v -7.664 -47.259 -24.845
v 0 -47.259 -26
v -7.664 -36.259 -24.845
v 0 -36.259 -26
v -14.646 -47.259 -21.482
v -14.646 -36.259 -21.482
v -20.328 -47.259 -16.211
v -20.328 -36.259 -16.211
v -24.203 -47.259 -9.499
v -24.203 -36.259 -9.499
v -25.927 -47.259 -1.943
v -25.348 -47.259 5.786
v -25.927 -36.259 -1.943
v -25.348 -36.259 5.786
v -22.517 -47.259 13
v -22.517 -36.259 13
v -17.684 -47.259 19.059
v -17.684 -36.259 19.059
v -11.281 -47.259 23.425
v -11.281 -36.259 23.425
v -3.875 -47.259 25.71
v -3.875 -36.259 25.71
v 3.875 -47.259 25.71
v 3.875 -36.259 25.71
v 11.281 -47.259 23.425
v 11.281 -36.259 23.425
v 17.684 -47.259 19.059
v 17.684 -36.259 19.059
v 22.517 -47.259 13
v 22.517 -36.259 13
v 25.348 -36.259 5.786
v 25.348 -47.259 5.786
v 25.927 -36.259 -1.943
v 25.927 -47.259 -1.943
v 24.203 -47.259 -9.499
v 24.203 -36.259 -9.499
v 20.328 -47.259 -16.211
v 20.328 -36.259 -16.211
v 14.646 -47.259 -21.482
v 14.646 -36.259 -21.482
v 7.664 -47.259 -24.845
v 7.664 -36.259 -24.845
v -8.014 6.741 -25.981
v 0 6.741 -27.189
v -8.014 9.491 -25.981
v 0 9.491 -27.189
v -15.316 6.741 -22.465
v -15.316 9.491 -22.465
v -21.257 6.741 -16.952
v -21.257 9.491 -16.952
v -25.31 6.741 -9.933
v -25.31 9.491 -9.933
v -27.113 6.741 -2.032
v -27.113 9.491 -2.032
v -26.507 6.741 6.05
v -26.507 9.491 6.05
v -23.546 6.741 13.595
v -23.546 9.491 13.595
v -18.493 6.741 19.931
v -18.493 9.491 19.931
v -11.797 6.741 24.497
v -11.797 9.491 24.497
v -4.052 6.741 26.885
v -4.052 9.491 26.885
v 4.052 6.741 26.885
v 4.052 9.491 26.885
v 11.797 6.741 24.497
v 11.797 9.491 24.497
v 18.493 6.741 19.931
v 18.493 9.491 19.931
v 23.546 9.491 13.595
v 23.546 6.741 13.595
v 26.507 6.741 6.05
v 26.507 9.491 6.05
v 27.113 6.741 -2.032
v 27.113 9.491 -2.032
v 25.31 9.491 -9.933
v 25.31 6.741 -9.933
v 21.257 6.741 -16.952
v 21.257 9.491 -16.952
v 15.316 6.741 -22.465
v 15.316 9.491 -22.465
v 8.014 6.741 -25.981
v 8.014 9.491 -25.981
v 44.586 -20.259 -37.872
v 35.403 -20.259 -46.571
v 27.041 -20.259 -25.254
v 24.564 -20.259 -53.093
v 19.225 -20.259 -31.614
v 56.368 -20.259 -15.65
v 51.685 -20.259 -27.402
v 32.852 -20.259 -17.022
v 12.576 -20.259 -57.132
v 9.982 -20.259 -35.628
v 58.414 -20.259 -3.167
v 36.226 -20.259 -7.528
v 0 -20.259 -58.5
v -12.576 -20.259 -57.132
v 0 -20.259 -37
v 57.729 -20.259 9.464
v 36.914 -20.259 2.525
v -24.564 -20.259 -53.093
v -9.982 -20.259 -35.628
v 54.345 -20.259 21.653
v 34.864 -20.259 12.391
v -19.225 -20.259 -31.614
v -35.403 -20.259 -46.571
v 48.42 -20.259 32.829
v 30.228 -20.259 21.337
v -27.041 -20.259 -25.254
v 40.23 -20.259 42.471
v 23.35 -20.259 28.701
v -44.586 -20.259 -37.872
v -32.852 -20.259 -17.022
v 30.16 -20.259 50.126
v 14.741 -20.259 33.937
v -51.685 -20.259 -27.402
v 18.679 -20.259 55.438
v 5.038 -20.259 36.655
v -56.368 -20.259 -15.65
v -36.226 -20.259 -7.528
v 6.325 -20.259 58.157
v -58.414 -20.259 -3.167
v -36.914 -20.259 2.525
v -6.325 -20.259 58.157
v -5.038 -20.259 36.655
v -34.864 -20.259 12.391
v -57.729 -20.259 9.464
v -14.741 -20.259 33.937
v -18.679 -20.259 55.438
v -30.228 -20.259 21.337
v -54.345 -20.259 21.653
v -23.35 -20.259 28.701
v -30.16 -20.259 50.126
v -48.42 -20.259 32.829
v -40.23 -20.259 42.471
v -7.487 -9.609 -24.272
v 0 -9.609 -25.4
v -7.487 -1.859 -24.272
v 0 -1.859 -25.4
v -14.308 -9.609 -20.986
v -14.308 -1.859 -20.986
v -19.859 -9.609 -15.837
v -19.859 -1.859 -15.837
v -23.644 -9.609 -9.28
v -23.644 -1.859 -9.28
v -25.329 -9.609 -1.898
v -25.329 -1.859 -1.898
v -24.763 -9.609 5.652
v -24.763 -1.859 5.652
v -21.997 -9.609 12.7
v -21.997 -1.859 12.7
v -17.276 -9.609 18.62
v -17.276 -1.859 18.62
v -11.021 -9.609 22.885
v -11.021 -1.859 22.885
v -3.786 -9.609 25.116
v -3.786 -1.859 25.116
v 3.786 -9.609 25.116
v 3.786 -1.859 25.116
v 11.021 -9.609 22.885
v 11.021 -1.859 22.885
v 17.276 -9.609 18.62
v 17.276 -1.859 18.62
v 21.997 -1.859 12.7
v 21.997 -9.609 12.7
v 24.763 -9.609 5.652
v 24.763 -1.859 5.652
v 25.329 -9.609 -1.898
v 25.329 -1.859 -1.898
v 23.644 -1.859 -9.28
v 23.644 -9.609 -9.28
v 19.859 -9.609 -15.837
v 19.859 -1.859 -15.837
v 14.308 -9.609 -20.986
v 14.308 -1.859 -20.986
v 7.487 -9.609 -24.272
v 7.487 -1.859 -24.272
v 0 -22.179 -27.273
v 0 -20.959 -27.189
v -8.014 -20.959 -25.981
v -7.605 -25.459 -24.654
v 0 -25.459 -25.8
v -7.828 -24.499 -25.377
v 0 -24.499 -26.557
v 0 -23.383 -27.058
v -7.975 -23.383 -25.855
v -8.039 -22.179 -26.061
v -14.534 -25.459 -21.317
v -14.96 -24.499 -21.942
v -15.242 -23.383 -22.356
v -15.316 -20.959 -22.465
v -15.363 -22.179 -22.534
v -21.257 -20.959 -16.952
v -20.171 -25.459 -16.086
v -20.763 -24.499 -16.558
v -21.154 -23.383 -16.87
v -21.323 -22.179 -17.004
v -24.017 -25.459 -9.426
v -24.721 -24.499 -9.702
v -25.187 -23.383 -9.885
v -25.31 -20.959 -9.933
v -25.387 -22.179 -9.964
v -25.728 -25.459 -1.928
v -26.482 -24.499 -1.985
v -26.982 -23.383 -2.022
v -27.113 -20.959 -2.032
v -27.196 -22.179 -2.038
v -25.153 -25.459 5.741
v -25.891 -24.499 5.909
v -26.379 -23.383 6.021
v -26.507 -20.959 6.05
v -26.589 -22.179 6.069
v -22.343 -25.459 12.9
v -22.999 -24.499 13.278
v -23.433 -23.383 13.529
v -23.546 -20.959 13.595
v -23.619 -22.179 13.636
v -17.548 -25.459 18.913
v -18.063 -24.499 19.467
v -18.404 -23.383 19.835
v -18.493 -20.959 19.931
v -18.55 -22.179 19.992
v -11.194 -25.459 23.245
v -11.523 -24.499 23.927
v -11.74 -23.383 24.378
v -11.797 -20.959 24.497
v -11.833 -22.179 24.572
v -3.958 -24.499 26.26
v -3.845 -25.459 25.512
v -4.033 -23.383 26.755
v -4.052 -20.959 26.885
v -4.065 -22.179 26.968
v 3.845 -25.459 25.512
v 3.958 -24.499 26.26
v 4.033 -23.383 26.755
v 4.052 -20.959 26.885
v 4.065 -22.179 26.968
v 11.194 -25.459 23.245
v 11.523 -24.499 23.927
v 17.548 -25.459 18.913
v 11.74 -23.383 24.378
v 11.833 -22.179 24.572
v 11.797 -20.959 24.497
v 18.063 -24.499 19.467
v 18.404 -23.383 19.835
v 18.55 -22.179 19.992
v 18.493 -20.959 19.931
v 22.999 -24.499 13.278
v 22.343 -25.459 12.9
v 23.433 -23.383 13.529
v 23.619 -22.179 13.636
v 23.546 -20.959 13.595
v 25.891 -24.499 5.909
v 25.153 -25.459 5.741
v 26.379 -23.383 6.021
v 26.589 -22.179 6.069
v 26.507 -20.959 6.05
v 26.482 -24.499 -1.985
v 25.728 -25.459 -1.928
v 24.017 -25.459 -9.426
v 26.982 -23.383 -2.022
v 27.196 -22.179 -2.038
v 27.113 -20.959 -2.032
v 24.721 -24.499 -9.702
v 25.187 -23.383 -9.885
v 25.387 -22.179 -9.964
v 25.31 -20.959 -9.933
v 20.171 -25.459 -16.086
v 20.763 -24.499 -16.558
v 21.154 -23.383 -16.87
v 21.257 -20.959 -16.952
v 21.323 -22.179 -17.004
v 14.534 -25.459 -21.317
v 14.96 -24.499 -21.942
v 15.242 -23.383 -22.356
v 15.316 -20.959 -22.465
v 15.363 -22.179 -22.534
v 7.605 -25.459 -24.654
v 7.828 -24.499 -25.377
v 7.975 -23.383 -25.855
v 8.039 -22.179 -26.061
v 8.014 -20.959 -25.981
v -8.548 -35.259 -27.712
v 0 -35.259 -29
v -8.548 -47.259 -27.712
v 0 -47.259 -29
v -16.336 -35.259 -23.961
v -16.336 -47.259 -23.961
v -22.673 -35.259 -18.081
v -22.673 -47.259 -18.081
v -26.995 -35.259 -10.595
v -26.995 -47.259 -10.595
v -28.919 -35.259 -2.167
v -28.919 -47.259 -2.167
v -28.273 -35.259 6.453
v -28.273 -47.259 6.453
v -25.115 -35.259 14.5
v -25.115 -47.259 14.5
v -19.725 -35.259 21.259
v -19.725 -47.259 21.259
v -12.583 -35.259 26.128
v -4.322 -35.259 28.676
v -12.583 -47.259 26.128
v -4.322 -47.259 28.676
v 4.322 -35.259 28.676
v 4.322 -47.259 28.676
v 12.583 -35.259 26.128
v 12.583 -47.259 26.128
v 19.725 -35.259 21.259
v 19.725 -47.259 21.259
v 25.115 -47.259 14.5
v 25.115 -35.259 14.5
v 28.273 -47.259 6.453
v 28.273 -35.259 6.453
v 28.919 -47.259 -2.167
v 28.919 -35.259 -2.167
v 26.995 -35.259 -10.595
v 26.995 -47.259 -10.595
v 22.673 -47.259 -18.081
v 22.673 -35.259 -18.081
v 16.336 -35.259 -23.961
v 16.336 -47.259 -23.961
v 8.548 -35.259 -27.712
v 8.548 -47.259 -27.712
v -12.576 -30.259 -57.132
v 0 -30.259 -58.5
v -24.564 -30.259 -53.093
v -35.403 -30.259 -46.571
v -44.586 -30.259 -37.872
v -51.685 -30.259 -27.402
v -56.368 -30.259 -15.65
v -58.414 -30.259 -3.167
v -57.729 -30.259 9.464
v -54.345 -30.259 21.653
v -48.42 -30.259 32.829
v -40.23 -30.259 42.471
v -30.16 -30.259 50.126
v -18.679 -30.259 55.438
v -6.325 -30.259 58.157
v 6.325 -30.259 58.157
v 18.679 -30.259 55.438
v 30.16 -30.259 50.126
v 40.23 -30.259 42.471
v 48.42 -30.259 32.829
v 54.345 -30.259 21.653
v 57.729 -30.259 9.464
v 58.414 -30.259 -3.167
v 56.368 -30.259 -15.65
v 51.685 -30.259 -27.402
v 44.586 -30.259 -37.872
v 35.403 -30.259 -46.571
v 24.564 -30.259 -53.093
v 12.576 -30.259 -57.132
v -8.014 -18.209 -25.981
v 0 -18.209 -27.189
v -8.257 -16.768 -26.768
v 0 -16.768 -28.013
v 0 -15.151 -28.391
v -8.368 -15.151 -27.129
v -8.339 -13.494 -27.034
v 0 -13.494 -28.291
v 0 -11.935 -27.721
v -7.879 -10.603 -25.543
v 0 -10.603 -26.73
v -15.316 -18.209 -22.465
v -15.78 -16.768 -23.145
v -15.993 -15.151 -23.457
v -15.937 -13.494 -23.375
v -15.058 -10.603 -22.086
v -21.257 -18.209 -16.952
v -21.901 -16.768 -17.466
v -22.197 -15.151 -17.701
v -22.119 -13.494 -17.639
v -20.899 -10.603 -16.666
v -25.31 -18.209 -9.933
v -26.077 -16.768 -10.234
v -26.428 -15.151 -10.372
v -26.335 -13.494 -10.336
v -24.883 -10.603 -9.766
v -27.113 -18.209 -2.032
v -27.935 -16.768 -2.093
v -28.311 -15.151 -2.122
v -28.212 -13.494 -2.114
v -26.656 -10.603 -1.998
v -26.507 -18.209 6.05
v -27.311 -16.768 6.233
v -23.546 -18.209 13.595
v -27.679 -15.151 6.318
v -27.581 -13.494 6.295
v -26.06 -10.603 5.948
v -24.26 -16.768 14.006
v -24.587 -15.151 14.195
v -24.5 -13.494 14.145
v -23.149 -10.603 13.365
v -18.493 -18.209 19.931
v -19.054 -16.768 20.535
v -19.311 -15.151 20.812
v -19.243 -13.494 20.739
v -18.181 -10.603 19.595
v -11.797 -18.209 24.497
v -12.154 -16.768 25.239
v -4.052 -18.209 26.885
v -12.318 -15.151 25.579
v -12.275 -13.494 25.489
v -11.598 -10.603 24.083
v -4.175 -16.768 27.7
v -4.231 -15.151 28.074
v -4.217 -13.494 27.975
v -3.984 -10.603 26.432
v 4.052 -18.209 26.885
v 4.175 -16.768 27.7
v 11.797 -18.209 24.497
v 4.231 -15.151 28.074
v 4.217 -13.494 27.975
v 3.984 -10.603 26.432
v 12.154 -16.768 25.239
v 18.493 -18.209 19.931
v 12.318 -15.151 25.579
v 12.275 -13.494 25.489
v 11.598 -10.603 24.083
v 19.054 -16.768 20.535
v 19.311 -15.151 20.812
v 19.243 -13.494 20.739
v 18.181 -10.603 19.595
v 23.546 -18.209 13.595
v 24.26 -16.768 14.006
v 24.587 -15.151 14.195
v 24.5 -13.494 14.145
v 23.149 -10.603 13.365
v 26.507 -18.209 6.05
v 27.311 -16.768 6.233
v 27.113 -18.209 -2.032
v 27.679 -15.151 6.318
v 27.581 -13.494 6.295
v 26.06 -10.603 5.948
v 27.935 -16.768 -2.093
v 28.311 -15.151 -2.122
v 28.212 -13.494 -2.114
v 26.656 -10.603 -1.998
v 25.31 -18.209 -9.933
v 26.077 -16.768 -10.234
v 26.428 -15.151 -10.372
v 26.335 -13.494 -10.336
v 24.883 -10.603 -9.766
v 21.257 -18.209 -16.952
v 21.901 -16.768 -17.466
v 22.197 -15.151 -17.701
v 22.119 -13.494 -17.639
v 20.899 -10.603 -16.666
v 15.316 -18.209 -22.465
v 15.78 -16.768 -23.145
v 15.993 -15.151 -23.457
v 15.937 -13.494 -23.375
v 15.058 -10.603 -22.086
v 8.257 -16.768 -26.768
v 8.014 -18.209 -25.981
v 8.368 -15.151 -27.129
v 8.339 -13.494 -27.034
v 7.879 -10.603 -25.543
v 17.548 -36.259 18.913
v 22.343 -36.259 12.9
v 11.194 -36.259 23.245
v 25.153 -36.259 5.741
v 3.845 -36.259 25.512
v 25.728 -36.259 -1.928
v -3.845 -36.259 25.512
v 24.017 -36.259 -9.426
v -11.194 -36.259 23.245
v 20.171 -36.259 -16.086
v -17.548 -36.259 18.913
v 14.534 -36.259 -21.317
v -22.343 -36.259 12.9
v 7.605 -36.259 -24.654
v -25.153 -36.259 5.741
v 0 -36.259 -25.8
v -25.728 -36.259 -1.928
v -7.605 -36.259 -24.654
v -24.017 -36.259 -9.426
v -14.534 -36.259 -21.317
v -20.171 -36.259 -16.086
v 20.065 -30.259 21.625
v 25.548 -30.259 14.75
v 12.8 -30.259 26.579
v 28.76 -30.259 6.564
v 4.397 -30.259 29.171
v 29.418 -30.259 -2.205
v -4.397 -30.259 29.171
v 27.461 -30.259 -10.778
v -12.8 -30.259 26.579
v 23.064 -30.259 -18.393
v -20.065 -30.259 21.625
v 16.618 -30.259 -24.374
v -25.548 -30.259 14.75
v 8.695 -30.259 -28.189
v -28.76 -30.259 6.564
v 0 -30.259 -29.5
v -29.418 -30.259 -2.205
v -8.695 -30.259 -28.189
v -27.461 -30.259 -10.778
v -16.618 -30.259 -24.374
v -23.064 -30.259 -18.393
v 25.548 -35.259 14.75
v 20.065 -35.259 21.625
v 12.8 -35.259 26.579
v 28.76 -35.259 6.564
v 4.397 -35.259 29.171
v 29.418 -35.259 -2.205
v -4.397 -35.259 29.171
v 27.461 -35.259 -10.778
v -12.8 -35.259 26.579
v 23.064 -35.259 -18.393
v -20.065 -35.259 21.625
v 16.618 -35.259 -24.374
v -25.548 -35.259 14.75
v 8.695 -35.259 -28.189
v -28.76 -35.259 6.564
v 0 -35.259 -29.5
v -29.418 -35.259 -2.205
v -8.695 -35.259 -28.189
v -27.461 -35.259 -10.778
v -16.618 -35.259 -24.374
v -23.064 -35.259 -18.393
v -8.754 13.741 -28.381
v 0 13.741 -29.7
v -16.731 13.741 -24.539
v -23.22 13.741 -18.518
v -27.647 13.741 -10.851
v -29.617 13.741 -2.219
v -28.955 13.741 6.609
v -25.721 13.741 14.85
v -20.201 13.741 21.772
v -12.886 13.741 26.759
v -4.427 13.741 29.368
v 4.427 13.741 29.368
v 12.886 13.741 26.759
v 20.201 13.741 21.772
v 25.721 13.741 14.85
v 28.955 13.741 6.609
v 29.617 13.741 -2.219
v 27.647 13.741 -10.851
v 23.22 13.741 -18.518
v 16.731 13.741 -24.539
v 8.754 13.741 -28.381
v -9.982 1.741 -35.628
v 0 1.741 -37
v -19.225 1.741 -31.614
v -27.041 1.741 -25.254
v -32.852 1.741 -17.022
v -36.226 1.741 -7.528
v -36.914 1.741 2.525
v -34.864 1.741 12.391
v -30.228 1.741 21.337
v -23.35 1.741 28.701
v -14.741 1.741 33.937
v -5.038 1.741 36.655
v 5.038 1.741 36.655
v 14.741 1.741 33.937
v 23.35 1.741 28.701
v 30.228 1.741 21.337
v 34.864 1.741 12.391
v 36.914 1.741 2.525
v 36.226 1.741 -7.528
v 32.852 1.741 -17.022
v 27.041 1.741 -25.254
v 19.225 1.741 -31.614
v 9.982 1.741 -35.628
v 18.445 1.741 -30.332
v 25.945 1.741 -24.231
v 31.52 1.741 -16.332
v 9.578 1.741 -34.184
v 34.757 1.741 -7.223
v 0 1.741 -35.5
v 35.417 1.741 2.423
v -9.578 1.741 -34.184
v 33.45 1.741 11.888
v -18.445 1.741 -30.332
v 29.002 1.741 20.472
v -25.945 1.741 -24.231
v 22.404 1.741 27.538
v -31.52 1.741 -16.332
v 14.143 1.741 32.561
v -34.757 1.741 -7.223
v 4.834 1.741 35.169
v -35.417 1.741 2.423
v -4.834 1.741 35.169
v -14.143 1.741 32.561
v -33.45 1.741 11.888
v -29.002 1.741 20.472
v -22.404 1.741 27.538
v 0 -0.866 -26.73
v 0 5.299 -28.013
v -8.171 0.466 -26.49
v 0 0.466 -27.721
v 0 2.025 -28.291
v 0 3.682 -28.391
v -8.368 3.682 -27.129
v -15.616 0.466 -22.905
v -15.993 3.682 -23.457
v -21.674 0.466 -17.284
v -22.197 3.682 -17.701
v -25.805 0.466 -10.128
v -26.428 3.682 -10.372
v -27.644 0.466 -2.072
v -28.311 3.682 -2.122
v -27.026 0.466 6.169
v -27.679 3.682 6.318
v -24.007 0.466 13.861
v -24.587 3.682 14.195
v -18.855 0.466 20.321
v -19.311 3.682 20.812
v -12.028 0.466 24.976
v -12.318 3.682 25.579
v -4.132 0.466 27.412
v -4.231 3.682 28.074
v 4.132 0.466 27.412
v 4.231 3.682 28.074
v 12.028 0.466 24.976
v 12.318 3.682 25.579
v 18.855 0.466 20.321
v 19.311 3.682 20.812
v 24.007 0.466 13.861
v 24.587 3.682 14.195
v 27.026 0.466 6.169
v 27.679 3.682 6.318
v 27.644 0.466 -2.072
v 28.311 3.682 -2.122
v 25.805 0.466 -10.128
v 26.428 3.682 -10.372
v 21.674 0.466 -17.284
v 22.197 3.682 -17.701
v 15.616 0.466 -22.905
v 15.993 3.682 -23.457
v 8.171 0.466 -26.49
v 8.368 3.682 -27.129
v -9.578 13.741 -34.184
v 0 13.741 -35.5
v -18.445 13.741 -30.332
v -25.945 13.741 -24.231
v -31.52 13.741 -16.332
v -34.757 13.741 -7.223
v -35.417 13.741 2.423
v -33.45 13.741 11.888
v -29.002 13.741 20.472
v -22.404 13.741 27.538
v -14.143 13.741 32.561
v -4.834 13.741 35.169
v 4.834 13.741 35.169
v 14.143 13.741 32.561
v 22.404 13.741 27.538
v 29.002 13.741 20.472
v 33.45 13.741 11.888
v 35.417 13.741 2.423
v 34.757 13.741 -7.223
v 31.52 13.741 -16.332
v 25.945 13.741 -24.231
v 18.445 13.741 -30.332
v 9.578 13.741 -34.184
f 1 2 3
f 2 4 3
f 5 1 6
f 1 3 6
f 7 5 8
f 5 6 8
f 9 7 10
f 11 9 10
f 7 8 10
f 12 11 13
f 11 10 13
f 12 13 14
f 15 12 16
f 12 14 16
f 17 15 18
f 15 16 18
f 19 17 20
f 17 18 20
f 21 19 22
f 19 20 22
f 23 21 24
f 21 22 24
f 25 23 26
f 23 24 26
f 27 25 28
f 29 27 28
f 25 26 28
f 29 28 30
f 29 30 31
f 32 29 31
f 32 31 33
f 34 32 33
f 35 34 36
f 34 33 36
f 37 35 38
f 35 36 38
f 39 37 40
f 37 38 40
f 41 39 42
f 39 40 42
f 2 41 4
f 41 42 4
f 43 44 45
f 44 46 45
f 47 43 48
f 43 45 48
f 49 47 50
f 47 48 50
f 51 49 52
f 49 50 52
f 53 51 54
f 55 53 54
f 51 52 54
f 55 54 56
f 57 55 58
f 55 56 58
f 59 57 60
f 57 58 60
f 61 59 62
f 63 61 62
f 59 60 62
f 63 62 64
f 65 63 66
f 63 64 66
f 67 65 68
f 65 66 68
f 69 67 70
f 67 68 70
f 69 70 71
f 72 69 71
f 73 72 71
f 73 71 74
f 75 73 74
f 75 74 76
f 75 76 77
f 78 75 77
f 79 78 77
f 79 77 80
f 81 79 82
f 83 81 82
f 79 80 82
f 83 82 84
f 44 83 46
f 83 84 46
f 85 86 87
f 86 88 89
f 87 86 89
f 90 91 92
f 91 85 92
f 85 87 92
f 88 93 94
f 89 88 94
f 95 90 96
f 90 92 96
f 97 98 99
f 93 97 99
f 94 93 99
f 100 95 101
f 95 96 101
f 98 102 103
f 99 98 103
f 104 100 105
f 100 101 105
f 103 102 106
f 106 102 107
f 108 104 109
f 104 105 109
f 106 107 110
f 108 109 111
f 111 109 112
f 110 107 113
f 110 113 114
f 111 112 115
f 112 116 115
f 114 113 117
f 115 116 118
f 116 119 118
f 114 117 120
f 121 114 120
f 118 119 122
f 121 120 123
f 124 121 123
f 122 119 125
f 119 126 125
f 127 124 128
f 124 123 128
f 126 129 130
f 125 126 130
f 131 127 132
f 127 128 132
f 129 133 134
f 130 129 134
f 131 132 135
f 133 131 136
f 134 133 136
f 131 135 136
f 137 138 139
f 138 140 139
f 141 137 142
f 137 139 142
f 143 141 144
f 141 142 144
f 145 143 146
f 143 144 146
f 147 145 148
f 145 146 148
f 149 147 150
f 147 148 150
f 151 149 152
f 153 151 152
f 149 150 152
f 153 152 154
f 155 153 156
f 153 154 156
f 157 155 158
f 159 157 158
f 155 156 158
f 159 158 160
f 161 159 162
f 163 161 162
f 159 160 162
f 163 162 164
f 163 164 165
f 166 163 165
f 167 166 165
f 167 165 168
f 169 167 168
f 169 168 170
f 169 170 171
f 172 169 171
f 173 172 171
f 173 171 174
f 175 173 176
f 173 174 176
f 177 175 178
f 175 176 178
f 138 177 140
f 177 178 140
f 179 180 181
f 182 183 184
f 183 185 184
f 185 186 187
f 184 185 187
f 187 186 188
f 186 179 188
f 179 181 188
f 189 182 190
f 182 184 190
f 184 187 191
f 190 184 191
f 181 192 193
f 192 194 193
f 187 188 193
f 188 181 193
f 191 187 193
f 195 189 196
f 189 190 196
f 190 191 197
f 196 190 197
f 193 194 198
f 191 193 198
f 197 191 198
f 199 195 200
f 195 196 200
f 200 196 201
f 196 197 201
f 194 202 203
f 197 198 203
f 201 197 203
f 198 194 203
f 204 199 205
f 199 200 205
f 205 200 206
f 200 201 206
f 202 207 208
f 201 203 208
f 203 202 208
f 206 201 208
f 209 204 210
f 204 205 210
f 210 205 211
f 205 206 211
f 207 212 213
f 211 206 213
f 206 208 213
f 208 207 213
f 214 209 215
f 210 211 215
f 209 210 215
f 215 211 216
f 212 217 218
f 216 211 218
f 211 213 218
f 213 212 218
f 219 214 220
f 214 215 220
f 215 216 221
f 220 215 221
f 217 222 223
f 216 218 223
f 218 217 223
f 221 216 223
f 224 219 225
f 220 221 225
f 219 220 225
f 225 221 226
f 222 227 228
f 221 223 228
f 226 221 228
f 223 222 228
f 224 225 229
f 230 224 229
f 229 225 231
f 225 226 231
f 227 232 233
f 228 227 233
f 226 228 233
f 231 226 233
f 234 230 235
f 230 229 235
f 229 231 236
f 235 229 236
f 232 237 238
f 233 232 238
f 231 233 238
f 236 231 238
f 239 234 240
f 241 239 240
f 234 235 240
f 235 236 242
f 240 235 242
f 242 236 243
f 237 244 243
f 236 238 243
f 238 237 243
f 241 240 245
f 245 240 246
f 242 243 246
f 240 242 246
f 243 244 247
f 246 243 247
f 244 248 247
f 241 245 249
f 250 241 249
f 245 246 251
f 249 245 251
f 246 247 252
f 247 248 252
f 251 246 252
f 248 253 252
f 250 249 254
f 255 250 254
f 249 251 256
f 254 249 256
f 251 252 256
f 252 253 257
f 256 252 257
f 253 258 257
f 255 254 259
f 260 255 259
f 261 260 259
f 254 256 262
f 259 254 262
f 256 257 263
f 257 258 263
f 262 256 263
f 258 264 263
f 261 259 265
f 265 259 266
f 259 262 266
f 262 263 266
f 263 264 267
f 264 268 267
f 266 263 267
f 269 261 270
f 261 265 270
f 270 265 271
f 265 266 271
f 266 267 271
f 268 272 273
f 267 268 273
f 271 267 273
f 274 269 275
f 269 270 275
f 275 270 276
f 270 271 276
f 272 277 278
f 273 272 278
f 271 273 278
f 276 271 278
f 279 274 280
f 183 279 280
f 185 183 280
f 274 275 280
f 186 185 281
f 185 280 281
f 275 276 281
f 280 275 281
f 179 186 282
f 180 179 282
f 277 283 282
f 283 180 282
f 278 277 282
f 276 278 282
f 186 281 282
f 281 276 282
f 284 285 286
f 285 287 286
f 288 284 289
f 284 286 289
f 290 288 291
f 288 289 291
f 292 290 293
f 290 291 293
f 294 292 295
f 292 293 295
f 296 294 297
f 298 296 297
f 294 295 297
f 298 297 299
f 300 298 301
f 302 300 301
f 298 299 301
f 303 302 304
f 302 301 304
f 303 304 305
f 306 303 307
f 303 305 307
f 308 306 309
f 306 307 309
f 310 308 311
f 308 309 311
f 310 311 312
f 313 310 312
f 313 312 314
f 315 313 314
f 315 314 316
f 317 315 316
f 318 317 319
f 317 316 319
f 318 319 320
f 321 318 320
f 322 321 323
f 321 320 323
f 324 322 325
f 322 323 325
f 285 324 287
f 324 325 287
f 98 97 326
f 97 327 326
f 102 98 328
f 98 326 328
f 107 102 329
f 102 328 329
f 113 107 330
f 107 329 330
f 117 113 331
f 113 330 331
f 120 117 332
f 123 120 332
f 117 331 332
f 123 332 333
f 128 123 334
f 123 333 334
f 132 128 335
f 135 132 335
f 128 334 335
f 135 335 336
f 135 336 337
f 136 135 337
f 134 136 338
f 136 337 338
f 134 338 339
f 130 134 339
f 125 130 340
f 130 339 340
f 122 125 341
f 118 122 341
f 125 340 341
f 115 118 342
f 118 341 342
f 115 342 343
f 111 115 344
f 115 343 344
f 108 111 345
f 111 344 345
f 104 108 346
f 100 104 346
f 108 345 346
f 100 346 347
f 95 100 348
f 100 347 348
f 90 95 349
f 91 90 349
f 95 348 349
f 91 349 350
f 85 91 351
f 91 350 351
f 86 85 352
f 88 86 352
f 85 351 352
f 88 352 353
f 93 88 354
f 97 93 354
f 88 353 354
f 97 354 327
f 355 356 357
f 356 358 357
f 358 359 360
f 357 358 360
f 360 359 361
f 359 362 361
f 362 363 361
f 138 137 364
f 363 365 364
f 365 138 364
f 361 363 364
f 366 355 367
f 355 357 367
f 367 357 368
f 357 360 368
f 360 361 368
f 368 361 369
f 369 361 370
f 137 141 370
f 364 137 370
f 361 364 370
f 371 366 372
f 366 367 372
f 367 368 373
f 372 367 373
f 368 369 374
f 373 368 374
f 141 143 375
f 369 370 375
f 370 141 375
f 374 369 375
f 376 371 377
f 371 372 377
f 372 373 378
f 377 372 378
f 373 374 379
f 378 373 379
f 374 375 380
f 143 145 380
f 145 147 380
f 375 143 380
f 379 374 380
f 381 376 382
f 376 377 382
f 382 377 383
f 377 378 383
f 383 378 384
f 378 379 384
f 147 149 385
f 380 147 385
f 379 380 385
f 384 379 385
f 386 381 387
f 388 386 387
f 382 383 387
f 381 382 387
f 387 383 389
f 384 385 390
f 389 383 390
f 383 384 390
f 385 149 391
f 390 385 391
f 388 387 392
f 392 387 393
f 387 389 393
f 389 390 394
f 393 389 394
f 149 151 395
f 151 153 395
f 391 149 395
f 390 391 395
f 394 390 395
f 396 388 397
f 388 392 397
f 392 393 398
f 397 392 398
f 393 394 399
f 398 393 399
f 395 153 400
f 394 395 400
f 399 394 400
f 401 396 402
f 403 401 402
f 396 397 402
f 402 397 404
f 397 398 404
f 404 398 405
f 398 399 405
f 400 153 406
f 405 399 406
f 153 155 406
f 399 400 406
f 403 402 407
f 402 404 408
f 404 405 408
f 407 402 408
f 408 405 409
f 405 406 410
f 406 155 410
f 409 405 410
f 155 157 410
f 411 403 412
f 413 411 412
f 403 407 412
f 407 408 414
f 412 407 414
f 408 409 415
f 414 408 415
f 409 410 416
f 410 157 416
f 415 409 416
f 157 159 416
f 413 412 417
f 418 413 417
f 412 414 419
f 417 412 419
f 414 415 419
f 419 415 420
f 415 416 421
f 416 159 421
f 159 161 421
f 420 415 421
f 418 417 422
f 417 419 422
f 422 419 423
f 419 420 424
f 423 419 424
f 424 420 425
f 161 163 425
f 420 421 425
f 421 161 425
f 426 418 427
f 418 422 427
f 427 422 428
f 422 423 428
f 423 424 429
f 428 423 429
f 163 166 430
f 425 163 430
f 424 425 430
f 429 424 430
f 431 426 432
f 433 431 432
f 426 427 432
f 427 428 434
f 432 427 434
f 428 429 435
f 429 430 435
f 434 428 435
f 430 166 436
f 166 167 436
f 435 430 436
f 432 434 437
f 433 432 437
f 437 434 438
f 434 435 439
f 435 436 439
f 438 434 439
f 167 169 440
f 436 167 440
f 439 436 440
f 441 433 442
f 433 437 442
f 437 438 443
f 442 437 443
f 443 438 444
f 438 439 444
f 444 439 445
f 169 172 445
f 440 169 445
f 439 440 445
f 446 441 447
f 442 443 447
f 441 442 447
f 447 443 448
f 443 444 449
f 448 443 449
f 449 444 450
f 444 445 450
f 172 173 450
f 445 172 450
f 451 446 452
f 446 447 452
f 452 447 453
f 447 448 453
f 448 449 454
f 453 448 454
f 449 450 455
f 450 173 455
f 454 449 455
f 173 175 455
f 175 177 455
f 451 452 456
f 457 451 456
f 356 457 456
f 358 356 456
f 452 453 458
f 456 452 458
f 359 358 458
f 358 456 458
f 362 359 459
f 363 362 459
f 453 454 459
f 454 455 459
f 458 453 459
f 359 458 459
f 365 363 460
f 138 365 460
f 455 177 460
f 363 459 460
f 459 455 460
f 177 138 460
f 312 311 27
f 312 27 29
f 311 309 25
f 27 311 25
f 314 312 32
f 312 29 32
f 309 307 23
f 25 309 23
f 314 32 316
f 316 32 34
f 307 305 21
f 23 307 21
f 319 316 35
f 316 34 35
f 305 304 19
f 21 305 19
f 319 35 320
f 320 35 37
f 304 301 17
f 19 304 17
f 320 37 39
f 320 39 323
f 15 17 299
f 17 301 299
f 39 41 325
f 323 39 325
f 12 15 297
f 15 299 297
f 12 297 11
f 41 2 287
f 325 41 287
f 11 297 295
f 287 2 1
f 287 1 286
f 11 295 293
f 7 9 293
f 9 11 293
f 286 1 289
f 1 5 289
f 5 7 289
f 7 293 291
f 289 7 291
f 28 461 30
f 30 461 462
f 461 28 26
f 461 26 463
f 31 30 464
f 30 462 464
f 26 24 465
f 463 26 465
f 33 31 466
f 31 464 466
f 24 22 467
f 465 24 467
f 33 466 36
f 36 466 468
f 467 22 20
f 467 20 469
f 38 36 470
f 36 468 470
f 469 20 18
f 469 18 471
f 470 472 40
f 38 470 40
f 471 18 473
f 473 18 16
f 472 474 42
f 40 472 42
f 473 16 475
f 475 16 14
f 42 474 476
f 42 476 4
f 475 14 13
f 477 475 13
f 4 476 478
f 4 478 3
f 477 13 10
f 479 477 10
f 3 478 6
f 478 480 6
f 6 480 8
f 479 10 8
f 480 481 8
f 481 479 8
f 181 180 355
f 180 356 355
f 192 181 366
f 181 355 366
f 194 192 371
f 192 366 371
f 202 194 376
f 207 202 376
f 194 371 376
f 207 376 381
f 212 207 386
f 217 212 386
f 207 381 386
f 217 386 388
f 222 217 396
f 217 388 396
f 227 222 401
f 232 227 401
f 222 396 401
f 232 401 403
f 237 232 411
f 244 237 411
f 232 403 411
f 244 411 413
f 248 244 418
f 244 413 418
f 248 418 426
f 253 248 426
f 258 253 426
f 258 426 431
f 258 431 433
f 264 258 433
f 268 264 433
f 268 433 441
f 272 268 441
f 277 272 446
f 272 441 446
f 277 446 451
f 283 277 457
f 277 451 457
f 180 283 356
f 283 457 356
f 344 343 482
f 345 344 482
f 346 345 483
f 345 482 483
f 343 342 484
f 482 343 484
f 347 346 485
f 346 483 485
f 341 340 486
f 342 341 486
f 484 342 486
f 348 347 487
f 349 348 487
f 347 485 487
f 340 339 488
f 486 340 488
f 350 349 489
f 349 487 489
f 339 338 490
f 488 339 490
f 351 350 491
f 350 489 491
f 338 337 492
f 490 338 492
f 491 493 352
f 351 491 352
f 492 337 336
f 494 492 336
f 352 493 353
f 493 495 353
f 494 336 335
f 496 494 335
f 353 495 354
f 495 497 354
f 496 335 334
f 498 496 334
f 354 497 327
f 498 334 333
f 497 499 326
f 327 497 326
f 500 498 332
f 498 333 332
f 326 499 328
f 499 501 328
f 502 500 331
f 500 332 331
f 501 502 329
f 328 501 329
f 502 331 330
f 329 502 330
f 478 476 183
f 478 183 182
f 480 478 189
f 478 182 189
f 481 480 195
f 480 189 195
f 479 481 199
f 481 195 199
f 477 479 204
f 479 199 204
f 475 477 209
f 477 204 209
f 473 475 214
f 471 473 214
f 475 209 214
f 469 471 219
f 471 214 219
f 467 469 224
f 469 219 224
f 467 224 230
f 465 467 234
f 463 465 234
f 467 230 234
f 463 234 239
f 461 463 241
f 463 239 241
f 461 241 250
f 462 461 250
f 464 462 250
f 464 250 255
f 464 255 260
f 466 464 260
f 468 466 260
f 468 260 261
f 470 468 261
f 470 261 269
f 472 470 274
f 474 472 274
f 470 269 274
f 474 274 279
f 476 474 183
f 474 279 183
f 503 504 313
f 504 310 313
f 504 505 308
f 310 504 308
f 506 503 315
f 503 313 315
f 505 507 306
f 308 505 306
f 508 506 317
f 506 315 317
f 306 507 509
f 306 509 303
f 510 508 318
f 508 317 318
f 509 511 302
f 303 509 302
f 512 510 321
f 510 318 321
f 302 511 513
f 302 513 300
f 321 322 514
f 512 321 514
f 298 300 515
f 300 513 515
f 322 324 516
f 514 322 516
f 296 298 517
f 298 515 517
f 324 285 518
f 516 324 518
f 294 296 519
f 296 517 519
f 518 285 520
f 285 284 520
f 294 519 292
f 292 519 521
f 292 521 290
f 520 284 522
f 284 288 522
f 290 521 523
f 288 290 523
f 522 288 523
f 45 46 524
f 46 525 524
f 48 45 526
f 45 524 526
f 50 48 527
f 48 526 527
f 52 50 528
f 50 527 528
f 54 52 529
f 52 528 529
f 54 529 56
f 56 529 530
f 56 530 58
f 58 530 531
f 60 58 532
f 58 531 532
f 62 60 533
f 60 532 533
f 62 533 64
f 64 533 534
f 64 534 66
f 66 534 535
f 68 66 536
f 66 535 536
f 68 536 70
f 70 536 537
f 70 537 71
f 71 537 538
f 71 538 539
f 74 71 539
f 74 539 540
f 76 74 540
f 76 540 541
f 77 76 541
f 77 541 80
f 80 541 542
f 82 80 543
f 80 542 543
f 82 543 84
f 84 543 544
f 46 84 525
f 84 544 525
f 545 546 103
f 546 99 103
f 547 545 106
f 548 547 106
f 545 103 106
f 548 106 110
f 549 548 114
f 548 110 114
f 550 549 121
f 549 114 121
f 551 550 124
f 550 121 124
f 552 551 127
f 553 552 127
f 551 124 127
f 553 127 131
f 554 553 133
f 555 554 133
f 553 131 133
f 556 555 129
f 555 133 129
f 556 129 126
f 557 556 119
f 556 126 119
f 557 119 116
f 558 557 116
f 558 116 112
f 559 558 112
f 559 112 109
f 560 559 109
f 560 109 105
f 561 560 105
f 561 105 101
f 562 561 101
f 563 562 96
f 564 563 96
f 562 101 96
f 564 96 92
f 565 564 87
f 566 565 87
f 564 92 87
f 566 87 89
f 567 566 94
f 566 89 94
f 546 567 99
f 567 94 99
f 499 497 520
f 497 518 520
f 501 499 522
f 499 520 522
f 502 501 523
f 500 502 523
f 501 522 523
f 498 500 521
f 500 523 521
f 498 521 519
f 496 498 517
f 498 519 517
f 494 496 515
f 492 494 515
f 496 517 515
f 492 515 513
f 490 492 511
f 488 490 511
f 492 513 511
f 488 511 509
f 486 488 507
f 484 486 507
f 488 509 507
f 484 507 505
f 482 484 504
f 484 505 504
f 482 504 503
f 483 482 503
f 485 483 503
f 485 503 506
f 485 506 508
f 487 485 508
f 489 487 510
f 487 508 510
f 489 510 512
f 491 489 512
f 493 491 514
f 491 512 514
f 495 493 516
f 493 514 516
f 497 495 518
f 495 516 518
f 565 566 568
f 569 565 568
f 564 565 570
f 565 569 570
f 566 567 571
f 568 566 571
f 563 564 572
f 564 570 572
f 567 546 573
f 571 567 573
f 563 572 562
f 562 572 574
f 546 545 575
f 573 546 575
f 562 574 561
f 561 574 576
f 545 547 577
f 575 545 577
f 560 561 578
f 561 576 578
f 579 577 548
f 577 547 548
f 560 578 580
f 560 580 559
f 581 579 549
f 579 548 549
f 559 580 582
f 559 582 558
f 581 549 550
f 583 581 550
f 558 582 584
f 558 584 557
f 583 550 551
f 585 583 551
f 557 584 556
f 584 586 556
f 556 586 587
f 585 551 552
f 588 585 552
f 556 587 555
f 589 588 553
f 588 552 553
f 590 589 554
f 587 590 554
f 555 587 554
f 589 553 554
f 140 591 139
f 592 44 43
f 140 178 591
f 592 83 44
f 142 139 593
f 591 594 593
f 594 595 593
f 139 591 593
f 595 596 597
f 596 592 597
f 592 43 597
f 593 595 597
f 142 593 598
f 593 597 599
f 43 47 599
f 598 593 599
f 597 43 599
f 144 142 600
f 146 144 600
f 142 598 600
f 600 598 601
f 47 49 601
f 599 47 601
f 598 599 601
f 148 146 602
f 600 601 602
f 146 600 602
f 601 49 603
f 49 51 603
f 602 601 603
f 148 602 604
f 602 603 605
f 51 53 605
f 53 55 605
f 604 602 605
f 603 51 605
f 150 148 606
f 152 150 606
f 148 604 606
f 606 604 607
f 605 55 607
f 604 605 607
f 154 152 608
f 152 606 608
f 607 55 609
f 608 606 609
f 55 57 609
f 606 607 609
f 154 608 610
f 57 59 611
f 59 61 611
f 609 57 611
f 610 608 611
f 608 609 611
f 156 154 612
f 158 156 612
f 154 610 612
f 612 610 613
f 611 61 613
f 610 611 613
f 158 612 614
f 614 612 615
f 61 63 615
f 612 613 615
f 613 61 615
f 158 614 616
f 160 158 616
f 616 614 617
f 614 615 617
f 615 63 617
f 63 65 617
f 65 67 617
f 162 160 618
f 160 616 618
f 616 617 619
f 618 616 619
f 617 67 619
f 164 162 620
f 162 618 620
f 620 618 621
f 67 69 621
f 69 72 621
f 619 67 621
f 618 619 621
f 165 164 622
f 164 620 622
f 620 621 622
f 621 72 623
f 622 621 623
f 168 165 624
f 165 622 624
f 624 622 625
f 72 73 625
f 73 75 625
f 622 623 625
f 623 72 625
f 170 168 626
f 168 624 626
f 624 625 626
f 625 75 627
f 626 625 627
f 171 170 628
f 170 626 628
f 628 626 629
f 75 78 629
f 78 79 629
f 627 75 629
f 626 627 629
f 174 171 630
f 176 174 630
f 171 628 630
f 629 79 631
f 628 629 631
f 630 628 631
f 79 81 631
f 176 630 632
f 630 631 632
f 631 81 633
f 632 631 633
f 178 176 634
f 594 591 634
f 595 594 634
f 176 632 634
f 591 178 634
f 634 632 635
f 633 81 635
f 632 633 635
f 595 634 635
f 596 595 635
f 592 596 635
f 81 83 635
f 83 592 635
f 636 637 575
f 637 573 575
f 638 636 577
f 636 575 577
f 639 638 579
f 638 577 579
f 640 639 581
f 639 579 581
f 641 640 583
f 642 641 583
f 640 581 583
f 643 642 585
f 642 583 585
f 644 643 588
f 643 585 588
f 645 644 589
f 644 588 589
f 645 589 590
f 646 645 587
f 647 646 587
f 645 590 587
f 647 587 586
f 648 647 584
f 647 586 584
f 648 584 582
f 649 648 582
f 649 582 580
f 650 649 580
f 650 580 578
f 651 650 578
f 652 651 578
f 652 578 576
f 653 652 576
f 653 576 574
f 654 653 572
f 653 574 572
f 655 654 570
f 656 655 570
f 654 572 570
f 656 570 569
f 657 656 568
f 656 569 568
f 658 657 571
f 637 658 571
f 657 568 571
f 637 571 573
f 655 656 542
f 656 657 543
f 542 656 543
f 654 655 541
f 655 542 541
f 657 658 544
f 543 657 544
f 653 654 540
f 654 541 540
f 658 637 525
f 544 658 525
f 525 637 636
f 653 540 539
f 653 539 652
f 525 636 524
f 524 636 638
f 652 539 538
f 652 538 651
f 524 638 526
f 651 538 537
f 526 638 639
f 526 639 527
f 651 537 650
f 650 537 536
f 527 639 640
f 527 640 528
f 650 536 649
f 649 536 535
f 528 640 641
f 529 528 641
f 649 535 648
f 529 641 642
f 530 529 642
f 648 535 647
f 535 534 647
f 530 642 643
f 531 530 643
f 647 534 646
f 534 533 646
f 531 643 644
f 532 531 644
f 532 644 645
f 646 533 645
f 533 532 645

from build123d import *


with BuildPart() as part:
    # Esboço1 → Revolução1 (revolve)
    with BuildSketch(Plane.XY, mode=Mode.PRIVATE) as revolu_o1_sk:
        with BuildLine():
            Line((29.7, 13.740559465), (35.5, 13.740559465))
            Line((35.5, 13.740559465), (35.5, 1.740559465))
            Line((35.5, 1.740559465), (37, 1.740559465))
            Line((37, 1.740559465), (37, -20.259440535))
            Line((37, -20.259440535), (58.5, -20.259440535))
            Line((58.5, -20.259440535), (58.5, -30.259440535))
            Line((58.5, -30.259440535), (29.5, -30.259440535))
            Line((29.5, -30.259440535), (29.5, -35.259440535))
            Line((29.5, -35.259440535), (29, -35.259440535))
            Line((29, -35.259440535), (29, -47.259440535))
            Line((29, -47.259440535), (26, -47.259440535))
            Line((26, -47.259440535), (26, -36.259440535))
            Line((26, -36.259440535), (25.8, -36.259440535))
            Line((25.8, -36.259440535), (25.8, -25.459440535))
            ThreePointArc((25.8, -25.459440535), (27.05755123, -23.383232322), (27.189114949, -20.959440535))
            Line((27.189114949, -20.959440535), (27.189114949, -18.209440535))
            ThreePointArc((27.189114949, -18.209440535), (28.290718341, -13.494165971), (25.4, -9.609440535))
            Line((25.4, -9.609440535), (25.4, -1.859440535))
            ThreePointArc((25.4, -1.859440535), (28.290718341, 2.025284902), (27.189114949, 6.740559465))
            Line((27.189114949, 6.740559465), (27.189114949, 9.490559465))
            Line((27.189114949, 9.490559465), (29.7, 13.740559465))
        make_face()
    revolve(revolu_o1_sk.sketch.rotate(Axis((0, -64.843062606, 0), (0, 1, 0)), 90), axis=Axis((0, -64.843062606, 0), (0, 1, 0)))


solid = part.part
